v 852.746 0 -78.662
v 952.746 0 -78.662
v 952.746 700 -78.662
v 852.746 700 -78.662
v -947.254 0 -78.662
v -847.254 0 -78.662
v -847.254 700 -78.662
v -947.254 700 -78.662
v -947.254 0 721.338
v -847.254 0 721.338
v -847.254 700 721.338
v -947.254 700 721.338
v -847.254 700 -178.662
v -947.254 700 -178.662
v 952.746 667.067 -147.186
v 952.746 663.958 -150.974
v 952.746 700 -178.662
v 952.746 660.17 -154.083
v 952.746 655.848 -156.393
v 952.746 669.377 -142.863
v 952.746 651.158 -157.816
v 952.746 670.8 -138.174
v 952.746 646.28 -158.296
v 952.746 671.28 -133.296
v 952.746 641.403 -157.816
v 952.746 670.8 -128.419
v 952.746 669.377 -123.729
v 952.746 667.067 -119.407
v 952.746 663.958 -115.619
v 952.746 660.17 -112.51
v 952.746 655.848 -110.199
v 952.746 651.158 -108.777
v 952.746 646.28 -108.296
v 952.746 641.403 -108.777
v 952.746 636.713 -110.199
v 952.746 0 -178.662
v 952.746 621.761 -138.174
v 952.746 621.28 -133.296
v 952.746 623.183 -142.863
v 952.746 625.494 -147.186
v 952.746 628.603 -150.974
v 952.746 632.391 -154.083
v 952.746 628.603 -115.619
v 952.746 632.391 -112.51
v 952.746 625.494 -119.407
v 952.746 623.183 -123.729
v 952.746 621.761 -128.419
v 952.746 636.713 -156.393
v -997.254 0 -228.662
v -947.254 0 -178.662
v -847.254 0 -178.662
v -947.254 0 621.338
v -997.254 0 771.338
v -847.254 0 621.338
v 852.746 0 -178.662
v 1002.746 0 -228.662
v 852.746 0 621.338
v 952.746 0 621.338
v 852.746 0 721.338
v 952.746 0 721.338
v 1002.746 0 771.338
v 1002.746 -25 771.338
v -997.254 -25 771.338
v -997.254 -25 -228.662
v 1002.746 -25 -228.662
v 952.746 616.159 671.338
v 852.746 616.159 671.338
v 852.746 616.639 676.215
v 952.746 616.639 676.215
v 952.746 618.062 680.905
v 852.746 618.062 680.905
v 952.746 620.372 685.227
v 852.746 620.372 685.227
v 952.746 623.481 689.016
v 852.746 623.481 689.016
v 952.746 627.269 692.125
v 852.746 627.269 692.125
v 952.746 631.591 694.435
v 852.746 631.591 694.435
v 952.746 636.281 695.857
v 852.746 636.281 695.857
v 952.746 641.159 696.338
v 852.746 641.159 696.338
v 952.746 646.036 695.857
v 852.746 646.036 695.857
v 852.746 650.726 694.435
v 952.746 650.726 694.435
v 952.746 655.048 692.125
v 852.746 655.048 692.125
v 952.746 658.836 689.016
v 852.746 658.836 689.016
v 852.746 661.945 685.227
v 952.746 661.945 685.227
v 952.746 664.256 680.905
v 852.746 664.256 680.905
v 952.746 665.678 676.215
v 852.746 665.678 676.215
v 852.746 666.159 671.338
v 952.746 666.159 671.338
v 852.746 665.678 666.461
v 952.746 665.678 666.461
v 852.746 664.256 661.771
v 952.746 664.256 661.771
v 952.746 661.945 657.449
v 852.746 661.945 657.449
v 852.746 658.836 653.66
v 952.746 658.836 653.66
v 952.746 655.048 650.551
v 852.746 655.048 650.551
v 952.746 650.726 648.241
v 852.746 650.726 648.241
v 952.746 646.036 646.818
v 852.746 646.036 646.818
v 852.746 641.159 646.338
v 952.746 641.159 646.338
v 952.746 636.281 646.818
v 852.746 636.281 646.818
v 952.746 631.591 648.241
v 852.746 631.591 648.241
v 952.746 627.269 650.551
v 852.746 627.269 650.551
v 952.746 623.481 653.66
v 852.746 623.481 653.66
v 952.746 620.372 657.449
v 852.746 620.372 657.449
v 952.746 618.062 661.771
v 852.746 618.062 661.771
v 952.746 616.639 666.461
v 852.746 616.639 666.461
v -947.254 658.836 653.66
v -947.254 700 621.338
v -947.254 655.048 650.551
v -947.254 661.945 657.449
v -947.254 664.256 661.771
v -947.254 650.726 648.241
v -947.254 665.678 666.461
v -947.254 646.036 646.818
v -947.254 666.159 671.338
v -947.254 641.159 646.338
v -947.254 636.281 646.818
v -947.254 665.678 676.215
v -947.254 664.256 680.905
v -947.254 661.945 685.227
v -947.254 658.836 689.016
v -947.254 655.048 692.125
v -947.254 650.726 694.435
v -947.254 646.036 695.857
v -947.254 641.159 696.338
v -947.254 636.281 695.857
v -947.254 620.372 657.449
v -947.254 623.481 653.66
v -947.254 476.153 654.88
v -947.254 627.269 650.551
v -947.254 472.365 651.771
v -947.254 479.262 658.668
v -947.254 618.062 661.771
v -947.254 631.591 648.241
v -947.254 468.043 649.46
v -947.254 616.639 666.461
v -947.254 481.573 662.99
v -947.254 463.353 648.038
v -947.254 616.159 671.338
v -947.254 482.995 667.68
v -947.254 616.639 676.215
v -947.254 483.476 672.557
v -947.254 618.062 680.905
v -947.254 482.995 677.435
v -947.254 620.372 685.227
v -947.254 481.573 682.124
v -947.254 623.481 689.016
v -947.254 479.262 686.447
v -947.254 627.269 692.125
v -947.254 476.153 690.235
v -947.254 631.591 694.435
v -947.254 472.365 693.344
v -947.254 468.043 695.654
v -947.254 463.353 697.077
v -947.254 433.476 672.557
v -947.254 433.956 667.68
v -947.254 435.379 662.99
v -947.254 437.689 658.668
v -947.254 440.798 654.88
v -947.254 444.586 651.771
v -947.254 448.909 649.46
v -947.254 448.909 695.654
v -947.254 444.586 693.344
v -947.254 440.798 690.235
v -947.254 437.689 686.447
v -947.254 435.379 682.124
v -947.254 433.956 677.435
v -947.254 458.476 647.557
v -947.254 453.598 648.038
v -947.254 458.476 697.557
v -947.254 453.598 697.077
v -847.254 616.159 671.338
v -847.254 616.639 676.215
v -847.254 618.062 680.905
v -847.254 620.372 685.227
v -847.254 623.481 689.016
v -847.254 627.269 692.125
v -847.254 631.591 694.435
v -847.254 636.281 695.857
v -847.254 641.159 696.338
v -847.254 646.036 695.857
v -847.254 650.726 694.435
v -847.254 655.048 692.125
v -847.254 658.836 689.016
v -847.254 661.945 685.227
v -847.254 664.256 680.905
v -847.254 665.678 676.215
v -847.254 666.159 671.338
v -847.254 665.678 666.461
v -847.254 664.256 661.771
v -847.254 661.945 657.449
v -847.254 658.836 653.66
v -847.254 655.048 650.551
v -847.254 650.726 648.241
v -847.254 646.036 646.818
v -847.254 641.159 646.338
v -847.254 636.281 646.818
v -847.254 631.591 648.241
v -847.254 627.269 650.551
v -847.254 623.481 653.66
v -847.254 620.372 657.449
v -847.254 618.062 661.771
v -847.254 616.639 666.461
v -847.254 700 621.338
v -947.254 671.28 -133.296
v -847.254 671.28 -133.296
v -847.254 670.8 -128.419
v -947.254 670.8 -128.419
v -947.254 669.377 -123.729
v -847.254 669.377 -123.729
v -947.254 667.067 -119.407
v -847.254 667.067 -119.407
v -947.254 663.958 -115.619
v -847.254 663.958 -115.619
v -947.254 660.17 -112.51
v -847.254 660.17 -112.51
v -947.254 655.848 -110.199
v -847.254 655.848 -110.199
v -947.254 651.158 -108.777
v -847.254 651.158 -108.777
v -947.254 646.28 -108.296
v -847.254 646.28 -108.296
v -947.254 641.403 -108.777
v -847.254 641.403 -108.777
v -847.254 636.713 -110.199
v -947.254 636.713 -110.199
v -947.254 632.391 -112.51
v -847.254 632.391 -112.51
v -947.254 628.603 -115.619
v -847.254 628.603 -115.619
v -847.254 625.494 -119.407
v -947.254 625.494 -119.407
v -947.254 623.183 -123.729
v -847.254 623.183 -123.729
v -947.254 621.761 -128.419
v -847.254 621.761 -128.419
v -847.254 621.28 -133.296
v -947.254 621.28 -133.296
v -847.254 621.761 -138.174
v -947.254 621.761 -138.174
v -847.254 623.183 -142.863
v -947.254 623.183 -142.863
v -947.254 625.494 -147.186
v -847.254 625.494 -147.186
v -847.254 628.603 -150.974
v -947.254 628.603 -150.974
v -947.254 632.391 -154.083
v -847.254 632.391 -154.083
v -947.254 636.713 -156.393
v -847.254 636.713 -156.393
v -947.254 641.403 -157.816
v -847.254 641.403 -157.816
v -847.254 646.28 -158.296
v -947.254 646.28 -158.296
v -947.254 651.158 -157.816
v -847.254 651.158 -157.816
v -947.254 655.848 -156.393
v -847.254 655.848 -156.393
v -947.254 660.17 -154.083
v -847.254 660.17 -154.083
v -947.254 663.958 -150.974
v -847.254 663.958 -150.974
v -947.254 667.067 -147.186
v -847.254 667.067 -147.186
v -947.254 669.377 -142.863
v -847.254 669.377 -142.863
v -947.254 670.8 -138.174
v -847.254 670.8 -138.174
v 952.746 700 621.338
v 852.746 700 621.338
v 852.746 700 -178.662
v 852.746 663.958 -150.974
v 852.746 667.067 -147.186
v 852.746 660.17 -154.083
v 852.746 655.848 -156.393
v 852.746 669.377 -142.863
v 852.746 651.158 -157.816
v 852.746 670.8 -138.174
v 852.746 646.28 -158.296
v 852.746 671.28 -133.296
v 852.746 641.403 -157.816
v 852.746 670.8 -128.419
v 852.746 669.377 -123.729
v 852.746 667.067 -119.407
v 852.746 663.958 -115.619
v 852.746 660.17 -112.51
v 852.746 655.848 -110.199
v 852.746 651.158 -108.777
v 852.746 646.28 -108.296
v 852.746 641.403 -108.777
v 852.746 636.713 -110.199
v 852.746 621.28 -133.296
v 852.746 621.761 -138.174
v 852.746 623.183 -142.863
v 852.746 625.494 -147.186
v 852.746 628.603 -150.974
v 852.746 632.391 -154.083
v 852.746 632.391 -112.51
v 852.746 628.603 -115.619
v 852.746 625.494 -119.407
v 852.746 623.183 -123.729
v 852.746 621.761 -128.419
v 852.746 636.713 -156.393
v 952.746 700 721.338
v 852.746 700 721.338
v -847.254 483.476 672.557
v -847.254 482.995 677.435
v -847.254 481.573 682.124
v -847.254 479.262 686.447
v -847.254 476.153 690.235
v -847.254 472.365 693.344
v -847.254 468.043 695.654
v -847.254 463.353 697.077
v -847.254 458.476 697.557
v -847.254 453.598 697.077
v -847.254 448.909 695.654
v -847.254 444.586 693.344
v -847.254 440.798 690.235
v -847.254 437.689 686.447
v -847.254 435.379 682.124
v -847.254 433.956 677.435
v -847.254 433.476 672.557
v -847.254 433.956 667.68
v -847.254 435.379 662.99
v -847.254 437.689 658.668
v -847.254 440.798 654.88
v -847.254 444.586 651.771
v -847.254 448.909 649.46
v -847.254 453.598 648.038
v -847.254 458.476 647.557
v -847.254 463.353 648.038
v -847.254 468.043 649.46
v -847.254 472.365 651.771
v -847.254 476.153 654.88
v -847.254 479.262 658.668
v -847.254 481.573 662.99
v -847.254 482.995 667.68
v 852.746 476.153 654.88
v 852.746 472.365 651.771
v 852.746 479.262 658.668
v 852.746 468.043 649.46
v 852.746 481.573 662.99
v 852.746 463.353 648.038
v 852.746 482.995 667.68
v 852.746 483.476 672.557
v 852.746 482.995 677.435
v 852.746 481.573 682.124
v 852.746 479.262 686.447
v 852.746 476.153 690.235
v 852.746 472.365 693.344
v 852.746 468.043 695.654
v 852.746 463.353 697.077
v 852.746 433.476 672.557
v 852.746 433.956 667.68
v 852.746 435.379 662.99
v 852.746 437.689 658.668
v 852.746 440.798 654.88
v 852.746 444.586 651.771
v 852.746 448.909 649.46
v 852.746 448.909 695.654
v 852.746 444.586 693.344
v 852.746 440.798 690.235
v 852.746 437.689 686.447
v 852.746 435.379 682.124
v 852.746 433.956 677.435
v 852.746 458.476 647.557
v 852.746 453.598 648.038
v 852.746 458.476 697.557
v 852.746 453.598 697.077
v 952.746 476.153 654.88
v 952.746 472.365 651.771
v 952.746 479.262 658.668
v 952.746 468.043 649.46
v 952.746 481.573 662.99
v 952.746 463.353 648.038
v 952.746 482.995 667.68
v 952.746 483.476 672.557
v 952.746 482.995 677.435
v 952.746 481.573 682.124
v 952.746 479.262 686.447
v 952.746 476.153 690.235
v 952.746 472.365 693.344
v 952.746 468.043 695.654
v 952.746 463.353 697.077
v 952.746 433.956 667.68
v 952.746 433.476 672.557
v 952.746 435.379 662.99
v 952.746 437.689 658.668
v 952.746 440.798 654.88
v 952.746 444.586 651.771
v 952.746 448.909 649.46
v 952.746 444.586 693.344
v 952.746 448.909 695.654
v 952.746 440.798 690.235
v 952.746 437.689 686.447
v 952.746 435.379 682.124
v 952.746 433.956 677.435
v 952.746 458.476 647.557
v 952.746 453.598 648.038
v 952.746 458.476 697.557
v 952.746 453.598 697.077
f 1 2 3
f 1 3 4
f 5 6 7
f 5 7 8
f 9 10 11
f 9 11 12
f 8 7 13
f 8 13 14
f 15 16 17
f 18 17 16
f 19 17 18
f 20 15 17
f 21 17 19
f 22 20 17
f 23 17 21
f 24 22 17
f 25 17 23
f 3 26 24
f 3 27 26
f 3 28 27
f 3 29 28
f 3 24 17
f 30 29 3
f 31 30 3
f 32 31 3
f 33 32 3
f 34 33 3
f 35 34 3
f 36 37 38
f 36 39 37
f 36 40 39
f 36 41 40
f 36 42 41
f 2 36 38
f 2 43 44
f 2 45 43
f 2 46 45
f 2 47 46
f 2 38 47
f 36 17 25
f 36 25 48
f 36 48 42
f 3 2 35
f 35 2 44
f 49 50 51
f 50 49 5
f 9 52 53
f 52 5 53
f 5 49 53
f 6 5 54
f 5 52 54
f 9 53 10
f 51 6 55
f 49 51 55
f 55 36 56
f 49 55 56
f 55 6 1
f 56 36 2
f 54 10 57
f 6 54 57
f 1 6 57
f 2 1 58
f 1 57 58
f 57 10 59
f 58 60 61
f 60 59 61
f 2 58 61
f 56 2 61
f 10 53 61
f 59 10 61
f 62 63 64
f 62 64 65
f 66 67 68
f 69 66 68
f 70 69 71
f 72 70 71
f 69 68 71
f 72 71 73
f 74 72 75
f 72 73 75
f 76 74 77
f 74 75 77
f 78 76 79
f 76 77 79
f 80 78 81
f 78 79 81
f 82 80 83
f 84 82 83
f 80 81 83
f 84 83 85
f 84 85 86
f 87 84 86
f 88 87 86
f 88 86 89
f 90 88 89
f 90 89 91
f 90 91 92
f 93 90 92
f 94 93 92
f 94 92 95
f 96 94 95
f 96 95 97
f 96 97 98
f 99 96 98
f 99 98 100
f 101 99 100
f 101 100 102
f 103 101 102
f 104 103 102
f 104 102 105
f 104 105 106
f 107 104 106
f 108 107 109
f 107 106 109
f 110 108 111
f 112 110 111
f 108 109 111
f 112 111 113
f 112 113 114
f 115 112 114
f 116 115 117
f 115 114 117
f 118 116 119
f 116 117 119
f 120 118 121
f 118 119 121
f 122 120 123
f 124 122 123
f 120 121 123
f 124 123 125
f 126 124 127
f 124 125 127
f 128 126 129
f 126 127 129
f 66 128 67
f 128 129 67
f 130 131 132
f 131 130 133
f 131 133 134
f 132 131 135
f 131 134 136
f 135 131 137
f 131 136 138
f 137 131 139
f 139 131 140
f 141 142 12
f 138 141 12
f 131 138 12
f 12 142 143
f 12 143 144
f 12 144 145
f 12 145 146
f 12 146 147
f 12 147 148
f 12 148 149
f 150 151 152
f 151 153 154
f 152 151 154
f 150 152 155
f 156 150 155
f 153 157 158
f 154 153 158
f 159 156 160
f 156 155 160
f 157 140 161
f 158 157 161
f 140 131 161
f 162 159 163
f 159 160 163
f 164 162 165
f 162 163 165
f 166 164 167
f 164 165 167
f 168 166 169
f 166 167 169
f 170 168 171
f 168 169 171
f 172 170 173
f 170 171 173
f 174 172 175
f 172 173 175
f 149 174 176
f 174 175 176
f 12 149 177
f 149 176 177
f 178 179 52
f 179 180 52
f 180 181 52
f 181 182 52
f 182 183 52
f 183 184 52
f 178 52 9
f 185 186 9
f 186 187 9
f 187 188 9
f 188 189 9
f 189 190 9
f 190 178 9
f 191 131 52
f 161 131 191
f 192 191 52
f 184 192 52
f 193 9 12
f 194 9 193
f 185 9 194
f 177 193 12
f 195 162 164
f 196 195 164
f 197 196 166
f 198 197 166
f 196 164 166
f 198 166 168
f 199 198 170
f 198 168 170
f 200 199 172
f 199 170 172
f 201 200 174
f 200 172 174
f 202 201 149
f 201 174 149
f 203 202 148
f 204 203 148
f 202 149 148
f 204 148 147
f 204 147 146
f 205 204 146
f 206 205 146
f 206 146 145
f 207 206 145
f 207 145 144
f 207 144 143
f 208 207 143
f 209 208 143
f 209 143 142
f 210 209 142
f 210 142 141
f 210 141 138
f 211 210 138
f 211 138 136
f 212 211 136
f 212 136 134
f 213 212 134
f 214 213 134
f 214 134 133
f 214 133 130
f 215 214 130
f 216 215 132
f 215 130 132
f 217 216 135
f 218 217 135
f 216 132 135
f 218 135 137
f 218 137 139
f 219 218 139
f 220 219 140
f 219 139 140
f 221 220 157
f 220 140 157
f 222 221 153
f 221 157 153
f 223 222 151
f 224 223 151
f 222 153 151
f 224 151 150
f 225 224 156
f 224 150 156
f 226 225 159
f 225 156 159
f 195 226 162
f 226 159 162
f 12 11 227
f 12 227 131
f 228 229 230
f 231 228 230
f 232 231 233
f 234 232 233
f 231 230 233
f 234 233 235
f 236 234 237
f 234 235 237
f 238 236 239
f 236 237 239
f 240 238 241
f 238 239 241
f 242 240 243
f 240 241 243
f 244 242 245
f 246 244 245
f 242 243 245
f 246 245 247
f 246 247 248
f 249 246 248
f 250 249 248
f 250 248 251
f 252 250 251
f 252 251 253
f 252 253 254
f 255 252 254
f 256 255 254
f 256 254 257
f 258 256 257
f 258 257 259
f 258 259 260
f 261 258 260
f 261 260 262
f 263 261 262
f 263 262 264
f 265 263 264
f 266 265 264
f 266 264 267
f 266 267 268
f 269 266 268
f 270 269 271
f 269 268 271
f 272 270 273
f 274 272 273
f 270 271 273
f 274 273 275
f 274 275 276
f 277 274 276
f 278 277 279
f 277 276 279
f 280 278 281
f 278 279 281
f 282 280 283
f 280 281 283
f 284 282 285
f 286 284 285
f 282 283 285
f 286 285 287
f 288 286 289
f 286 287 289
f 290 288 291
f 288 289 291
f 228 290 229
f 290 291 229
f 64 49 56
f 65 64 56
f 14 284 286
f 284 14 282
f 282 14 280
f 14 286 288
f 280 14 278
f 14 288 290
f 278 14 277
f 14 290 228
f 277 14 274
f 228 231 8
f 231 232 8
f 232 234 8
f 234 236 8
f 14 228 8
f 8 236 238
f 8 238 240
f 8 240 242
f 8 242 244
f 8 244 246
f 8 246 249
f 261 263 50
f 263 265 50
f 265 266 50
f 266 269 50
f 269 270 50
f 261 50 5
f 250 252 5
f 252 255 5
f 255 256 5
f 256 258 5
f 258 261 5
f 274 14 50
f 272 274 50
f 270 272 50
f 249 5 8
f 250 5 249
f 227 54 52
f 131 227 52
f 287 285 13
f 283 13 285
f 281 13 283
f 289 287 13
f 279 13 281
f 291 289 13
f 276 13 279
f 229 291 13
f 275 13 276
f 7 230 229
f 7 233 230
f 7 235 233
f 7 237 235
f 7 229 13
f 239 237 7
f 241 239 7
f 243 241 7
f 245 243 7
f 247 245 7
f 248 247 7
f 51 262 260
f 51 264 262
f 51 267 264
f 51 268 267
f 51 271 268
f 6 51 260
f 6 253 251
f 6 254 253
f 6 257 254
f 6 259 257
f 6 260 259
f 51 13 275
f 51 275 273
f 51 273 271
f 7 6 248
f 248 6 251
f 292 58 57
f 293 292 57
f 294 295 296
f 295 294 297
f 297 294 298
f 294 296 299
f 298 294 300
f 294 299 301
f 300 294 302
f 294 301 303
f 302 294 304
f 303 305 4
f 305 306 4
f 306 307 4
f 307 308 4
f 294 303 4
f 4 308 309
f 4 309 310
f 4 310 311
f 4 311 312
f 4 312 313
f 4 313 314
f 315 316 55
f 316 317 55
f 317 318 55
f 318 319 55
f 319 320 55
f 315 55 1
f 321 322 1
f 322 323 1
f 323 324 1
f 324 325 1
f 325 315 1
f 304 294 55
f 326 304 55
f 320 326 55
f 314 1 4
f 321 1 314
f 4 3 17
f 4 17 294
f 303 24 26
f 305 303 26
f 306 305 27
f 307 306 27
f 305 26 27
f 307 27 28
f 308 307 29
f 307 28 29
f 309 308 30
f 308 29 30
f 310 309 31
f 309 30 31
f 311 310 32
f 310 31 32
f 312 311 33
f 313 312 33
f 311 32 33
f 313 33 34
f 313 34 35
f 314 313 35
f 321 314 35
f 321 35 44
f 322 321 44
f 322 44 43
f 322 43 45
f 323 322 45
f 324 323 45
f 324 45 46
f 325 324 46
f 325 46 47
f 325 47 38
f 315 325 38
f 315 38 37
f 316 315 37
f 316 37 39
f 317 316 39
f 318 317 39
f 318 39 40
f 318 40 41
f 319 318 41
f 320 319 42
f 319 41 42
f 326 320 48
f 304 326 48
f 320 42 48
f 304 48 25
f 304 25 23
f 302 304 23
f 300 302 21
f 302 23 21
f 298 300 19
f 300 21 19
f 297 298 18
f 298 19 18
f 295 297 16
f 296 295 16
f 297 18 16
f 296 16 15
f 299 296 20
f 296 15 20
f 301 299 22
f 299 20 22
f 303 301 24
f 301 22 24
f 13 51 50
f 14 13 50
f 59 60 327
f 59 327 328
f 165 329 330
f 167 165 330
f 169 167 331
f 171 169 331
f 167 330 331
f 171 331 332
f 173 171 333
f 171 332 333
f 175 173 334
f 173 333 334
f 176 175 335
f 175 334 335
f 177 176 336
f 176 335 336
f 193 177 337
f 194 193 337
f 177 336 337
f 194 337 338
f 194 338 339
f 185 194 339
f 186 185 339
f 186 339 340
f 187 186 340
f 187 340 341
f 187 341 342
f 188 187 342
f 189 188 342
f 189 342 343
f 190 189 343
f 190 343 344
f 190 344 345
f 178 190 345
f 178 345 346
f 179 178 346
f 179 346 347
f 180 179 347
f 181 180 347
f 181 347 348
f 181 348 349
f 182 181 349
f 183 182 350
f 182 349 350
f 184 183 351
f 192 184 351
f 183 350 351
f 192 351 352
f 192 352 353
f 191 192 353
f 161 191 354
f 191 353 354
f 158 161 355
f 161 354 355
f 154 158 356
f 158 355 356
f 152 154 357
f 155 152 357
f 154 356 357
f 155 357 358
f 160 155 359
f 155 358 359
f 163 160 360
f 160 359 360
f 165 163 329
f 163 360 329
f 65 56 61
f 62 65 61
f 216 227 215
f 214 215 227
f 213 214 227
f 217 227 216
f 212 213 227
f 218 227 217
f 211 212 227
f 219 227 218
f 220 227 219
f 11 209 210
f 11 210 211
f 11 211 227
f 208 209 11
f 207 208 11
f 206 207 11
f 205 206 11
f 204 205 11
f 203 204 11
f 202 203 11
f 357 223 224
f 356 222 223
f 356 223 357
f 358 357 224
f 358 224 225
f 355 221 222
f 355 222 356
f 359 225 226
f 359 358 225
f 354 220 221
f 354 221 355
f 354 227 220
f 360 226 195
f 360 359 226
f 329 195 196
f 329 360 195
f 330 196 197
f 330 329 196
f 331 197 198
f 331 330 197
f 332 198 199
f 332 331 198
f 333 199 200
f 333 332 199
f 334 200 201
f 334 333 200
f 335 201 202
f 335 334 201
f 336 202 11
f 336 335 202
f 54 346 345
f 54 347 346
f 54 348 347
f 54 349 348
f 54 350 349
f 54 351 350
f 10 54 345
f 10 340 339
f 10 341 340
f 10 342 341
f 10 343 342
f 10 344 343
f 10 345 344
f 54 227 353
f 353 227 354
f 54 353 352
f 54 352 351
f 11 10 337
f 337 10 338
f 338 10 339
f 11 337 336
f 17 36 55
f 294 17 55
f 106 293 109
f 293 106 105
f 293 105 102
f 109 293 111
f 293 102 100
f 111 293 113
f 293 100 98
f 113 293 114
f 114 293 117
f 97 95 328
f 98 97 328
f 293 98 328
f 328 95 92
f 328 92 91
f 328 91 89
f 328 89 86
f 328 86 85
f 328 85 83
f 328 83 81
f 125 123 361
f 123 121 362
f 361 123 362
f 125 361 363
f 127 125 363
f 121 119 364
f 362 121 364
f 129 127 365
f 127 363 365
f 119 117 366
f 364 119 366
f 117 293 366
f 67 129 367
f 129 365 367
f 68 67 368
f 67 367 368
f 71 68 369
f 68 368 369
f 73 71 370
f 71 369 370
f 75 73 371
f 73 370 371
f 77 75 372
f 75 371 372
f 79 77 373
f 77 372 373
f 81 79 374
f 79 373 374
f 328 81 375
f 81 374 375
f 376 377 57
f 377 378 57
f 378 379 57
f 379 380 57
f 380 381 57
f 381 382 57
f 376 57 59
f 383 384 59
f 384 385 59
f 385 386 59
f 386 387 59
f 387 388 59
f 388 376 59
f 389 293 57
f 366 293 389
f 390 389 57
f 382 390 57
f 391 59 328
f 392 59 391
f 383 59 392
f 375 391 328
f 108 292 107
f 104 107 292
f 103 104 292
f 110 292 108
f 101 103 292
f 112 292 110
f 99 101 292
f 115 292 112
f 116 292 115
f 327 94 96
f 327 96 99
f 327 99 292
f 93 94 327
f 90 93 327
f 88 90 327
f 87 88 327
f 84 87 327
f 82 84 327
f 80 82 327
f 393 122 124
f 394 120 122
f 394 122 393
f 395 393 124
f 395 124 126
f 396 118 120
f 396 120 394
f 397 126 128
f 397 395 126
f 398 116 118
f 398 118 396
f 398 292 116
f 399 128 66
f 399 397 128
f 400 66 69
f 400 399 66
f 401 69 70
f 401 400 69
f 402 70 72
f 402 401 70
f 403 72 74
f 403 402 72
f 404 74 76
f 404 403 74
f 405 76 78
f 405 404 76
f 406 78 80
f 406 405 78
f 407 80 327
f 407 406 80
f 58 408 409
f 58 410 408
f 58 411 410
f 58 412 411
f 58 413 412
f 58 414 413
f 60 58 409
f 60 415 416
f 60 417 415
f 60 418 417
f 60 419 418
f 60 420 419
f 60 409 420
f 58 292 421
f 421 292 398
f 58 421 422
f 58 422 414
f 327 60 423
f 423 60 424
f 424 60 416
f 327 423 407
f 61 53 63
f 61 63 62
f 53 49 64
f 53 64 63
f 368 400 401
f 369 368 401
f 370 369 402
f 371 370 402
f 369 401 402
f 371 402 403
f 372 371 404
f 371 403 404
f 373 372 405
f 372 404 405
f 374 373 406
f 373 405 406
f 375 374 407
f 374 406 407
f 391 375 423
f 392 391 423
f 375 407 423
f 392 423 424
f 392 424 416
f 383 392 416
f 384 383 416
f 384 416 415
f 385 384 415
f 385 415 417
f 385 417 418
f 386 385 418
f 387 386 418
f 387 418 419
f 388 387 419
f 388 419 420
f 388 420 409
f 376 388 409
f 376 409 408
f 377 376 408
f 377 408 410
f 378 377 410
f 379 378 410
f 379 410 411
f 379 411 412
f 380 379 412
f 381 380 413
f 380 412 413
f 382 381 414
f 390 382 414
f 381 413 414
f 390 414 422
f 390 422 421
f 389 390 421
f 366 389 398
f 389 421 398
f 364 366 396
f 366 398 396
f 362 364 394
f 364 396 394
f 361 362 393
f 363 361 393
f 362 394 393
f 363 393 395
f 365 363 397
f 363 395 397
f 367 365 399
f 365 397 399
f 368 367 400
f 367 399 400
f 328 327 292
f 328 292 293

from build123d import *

# Parameters (mm, degrees)
F0_W      = 2000
F0_H      = 1000
F1_DEPTH  = 25
F2_W      = 100
F2_H      = 100
F3_DEPTH  = 700
F4_W      = 100
F4_H      = 100
F5_DEPTH  = 700
F6_W      = 100
F6_H      = 100
F7_DEPTH  = 700
F8_W      = 100
F8_H      = 100
F9_DEPTH  = 700
F10_R     = 25
F11_DEPTH = 1950.001
F12_R     = 25
F13_DEPTH = 1950.001
F14_R     = 25
F15_DEPTH = 1950.001


with BuildPart() as f1:
    # F0 (on Front) → F1 (new body)
    with BuildSketch(Plane.XZ):
        with Locations((2.746239, 271.337836)):
            Rectangle(F0_W, F0_H)
    extrude(amount=F1_DEPTH)

    # F2 (on face) → F3 (join)
    with BuildSketch(Plane(origin=(0, 0, 0), x_dir=(-1, 0, 0), z_dir=(0, 1, 0))):
        with Locations((-902.746239, 671.337836)):
            Rectangle(F2_W, F2_H)
    extrude(amount=F3_DEPTH)

    # F4 (on face) → F5 (join)
    with BuildSketch(Plane(origin=(0, 0, 0), x_dir=(-1, 0, 0), z_dir=(0, 1, 0))):
        with Locations((897.253761, 671.337836)):
            Rectangle(F4_W, F4_H)
    extrude(amount=F5_DEPTH)

    # F6 (on face) → F7 (join)
    with BuildSketch(Plane(origin=(0, 0, 0), x_dir=(-1, 0, 0), z_dir=(0, 1, 0))):
        with Locations((-902.746239, -128.662164)):
            Rectangle(F6_W, F6_H)
    extrude(amount=F7_DEPTH)

    # F8 (on face) → F9 (join)
    with BuildSketch(Plane(origin=(0, 0, 0), x_dir=(-1, 0, 0), z_dir=(0, 1, 0))):
        with Locations((897.253761, -128.662164)):
            Rectangle(F8_W, F8_H)
    extrude(amount=F9_DEPTH)

    # F10 (on face) → F11 (cut, through all)
    with BuildSketch(Plane(origin=(-947.253761, 0, 0), x_dir=(0, -1, 0), z_dir=(-1, 0, 0))):
        with Locations((-641.158521, 671.337836)):
            Circle(F10_R)
    extrude(amount=-F11_DEPTH, mode=Mode.SUBTRACT)

    # F12 (on face) → F13 (cut, through all)
    with BuildSketch(Plane.YZ.offset(952.746239)):
        with Locations((646.280468, -133.296296)):
            Circle(F12_R)
    extrude(amount=-F13_DEPTH, mode=Mode.SUBTRACT)

    # F14 (on face) → F15 (cut, through all)
    with BuildSketch(Plane.YZ.offset(952.746239)):
        with Locations((458.47559, 672.557294)):
            Circle(F14_R)
    extrude(amount=-F15_DEPTH, mode=Mode.SUBTRACT)


solid = f1.part
